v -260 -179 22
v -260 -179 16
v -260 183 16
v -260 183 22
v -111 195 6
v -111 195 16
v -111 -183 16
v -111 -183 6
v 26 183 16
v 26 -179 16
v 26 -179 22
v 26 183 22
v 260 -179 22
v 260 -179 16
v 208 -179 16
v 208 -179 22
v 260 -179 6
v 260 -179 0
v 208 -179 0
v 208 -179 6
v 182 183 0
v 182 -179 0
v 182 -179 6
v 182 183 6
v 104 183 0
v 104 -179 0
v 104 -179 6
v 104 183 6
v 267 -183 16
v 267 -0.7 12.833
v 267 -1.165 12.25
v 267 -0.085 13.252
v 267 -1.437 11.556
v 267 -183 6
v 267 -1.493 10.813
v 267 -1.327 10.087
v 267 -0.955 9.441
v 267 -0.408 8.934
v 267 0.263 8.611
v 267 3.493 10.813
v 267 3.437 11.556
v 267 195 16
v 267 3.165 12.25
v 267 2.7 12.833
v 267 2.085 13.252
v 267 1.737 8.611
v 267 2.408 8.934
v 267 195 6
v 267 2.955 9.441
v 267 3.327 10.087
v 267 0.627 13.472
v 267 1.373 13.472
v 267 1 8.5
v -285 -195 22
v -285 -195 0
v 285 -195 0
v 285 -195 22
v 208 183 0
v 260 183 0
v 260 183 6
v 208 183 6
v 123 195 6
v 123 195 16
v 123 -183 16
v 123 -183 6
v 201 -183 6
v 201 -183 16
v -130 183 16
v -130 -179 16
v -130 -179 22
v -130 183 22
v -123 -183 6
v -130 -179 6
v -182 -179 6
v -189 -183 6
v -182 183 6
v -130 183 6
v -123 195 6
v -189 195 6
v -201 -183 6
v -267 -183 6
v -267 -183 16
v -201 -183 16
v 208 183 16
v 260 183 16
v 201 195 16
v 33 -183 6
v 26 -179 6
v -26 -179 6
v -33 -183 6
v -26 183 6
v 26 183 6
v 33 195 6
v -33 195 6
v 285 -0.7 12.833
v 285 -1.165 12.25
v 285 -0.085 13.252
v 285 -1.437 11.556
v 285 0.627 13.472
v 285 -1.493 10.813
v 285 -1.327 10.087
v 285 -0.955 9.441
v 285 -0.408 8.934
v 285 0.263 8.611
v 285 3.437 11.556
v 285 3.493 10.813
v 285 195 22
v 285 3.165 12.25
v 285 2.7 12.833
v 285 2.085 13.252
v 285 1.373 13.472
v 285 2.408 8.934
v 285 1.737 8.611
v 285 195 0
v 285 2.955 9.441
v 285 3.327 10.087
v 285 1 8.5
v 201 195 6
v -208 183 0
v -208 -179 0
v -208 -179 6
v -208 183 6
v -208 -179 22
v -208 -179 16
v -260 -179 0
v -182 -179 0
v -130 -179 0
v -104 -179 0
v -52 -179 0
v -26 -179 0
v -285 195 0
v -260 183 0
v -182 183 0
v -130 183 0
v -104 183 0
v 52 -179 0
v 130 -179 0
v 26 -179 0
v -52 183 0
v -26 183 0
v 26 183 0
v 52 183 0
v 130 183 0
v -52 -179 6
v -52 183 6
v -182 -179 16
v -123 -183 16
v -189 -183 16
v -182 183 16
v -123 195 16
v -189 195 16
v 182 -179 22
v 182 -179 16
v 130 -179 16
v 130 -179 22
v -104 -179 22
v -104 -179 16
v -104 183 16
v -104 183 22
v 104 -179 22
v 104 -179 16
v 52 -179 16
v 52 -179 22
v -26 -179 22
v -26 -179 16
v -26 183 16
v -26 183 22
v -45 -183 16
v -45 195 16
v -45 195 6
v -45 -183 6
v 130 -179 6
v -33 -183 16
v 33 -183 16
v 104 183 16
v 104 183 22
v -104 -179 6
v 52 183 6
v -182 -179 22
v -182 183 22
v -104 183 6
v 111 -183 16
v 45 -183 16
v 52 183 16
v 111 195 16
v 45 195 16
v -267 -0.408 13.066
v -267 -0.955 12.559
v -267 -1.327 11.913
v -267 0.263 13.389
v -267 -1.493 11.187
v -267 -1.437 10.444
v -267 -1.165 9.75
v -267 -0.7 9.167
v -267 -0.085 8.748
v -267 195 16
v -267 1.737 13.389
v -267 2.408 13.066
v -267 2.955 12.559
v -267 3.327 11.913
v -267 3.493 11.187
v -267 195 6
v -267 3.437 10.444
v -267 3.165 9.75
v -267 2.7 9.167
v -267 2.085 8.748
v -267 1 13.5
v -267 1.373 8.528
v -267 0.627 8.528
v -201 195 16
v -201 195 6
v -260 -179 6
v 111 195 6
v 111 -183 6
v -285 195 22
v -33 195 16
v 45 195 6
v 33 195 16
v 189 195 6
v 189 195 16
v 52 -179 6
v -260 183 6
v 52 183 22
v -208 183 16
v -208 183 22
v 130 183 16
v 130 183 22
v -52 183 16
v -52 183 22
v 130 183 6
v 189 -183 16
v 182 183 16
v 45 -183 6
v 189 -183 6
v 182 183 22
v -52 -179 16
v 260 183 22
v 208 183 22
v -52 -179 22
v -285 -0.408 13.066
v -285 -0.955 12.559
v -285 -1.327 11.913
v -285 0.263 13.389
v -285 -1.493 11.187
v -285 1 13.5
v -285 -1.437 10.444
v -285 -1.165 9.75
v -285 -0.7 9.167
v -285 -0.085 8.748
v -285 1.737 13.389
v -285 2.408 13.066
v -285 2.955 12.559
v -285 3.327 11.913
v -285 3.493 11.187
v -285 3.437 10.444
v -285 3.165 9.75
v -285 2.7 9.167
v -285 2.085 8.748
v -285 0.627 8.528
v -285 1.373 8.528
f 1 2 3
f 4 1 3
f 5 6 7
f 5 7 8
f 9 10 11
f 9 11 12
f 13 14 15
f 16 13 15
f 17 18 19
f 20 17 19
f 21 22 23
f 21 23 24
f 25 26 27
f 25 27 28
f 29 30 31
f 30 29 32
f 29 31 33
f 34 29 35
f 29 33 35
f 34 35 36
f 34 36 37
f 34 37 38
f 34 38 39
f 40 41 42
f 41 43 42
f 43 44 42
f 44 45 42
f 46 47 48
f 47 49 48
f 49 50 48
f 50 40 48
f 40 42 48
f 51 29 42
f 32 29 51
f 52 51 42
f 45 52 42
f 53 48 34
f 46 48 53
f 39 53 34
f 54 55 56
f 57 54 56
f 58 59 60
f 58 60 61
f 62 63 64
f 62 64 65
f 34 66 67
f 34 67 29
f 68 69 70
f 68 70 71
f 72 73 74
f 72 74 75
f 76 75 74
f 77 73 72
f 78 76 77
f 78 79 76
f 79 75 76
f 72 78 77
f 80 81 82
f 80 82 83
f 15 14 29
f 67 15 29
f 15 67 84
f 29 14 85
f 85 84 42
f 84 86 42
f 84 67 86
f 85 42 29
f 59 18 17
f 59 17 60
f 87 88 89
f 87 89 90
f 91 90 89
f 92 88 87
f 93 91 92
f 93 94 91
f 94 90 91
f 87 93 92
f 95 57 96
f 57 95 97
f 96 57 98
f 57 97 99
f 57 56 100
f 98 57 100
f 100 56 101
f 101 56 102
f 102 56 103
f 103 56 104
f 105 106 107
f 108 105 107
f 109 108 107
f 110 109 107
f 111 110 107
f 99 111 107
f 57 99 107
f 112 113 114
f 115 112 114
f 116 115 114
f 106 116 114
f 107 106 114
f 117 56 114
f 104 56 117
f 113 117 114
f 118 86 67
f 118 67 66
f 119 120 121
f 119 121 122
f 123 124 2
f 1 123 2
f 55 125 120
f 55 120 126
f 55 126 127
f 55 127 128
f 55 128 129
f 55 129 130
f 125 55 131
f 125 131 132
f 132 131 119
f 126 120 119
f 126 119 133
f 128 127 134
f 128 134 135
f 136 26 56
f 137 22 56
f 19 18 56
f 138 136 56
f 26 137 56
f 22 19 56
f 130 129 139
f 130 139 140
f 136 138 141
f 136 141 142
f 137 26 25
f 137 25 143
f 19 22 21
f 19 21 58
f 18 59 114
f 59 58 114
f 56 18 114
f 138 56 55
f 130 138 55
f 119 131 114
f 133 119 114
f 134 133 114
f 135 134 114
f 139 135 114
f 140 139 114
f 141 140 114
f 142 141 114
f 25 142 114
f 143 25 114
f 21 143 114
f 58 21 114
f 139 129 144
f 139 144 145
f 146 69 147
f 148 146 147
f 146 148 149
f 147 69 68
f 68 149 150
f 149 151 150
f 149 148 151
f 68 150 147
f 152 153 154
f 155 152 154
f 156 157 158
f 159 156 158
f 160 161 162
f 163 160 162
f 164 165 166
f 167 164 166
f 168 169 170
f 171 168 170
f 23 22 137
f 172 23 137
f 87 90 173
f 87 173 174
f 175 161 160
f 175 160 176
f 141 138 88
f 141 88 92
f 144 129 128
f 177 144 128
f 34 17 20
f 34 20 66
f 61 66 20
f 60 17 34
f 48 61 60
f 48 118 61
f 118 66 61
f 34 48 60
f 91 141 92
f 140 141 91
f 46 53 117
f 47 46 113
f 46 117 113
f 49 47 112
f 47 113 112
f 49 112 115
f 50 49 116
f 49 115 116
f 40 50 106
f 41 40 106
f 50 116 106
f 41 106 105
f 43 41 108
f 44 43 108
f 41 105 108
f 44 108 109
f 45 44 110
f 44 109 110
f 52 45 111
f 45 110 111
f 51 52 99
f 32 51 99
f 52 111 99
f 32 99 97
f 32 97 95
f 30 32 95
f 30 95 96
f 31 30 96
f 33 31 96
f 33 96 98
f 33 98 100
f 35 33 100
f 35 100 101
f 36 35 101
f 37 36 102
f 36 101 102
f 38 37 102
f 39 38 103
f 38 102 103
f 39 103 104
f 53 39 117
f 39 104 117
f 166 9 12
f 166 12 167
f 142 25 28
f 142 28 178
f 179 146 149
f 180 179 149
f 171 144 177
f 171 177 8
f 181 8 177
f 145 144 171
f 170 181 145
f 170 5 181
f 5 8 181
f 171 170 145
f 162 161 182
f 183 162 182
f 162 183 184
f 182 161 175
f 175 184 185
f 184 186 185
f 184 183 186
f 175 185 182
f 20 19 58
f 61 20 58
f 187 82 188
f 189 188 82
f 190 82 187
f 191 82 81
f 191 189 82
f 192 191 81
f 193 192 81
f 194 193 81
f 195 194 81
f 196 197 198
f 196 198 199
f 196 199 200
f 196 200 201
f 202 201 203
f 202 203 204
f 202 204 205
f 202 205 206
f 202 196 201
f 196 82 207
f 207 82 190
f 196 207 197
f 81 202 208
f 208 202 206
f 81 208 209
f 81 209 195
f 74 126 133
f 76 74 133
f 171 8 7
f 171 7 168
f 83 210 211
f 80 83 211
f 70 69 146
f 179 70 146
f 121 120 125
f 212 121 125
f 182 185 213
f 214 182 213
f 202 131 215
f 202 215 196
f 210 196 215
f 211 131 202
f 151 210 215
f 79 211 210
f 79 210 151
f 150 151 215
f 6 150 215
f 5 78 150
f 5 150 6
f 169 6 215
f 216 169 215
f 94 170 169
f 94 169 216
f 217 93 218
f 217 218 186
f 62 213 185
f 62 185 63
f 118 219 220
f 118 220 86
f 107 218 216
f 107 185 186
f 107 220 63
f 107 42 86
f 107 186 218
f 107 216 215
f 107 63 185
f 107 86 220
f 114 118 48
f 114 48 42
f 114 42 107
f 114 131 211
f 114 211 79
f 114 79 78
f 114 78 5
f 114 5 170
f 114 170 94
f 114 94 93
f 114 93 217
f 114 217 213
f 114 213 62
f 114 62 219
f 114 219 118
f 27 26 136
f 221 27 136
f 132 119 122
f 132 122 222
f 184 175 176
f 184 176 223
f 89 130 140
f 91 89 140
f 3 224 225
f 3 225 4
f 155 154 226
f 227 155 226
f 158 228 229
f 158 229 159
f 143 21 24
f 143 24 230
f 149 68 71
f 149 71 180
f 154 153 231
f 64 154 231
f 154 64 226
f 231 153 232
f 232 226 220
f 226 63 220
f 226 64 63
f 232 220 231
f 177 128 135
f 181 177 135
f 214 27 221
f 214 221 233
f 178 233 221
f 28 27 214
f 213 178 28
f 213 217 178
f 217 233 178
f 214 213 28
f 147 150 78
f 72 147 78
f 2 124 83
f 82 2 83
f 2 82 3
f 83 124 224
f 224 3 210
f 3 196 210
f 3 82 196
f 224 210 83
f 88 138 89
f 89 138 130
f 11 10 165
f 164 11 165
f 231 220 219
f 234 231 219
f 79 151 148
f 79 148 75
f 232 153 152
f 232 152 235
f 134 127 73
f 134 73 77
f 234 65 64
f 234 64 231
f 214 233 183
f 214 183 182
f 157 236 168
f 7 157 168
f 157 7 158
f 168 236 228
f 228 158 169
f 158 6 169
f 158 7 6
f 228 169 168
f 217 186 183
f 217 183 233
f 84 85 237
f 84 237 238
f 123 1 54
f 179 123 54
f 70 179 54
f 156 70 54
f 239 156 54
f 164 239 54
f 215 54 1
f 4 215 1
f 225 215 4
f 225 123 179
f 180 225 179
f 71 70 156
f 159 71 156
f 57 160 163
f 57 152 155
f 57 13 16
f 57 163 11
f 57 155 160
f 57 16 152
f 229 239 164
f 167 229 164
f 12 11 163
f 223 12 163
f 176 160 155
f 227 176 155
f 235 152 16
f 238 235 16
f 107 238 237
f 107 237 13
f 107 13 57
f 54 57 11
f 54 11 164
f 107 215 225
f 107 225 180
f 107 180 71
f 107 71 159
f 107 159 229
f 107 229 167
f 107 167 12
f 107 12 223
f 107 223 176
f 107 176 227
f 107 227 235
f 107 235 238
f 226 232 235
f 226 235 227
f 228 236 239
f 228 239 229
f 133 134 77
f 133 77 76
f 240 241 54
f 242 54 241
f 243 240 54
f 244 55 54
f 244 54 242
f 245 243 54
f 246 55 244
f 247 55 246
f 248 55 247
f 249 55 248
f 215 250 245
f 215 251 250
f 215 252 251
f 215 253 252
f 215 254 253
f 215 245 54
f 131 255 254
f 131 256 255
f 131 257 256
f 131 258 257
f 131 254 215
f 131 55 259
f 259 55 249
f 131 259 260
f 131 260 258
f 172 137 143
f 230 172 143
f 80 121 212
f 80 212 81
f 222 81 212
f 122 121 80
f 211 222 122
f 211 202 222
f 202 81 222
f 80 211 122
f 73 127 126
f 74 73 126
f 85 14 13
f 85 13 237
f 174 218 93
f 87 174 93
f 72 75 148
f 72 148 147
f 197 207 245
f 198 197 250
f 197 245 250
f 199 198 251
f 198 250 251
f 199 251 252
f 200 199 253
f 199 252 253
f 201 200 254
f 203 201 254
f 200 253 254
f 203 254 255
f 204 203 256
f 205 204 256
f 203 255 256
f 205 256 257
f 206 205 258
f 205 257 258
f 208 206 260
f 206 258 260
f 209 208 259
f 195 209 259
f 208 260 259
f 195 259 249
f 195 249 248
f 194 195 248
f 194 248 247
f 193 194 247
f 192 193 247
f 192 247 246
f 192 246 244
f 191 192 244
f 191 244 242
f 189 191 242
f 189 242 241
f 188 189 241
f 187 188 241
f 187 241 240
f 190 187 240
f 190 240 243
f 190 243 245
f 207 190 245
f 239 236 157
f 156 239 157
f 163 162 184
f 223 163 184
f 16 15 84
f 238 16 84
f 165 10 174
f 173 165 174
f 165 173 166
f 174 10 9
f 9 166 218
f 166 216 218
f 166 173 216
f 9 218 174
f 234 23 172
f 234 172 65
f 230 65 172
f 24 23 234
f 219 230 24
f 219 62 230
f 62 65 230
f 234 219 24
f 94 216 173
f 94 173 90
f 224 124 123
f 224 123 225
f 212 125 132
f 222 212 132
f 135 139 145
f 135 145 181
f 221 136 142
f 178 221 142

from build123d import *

# Parameters (mm, degrees)
SKETCH2_W           = 570
SKETCH2_H           = 390
BOSS_EXTRUDE1_DEPTH = 22
SKETCH4_W           = 534
SKETCH4_H           = 10
CUT_EXTRUDE1_DEPTH  = 378
SKETCH5_W           = 12
SKETCH5_H           = 10
BOSS_EXTRUDE2_DEPTH = 378
CUT_EXTRUDE3_REACH  = 572
SKETCH6_R           = 2.5
CUT_EXTRUDE4_REACH  = 572
SKETCH7_R           = 2.5
SKETCH3_W           = 52
SKETCH3_H           = 362
CUT_EXTRUDE5_DEPTH  = 23


with BuildPart() as part:
    # Sketch2 → Boss-Extrude1 (new body)
    with BuildSketch(Plane.XY):
        Rectangle(SKETCH2_W, SKETCH2_H)
    extrude(amount=BOSS_EXTRUDE1_DEPTH)

    # Sketch4 → Cut-Extrude1 (cut)
    with BuildSketch(Plane(origin=(0, 195, 0), x_dir=(1, 0, 0), z_dir=(0, 1, 0))):
        with Locations((0, -11)):
            Rectangle(SKETCH4_W, SKETCH4_H)
    extrude(amount=-CUT_EXTRUDE1_DEPTH, mode=Mode.SUBTRACT)

    # Sketch5 → Boss-Extrude2 (add)
    with BuildSketch(Plane(origin=(0, 195, 0), x_dir=(1, 0, 0), z_dir=(0, 1, 0))):
        with Locations((195, -11)):
            Rectangle(SKETCH5_W, SKETCH5_H)
        with Locations((117, -11)):
            Rectangle(SKETCH5_W, SKETCH5_H)
        with Locations((39, -11)):
            Rectangle(SKETCH5_W, SKETCH5_H)
        with Locations((-39, -11)):
            Rectangle(SKETCH5_W, SKETCH5_H)
        with Locations((-117, -11)):
            Rectangle(SKETCH5_W, SKETCH5_H)
        with Locations((-195, -11)):
            Rectangle(SKETCH5_W, SKETCH5_H)
    extrude(amount=-BOSS_EXTRUDE2_DEPTH)

    # Sketch6 → Cut-Extrude3 (cut, up to next)
    with BuildSketch(Plane.ZY.offset(285), mode=Mode.PRIVATE) as cut_extrude3_sk1:
        with Locations((11, 1)):
            Circle(SKETCH6_R)
    cut_extrude3_tool1 = extrude(cut_extrude3_sk1.sketch, amount=-CUT_EXTRUDE3_REACH, mode=Mode.PRIVATE) & part.part
    add(cut_extrude3_tool1.solids().sort_by_distance((-285, 1, 11))[0], mode=Mode.SUBTRACT)

    # Sketch7 → Cut-Extrude4 (cut, up to next)
    with BuildSketch(Plane(origin=(285, 0, 0), x_dir=(0, 0, -1), z_dir=(1, 0, 0)), mode=Mode.PRIVATE) as cut_extrude4_sk1:
        with Locations((-11, 1)):
            Circle(SKETCH7_R)
    cut_extrude4_tool1 = extrude(cut_extrude4_sk1.sketch, amount=-CUT_EXTRUDE4_REACH, mode=Mode.PRIVATE) & part.part
    add(cut_extrude4_tool1.solids().sort_by_distance((285, 1, 11))[0], mode=Mode.SUBTRACT)

    # Sketch3 → Cut-Extrude5 (cut, through all)
    with BuildSketch(Plane(origin=(0, 0, 0), x_dir=(-1, 0, 0), z_dir=(0, 0, -1))):
        with Locations((-156, 2)):
            Rectangle(SKETCH3_W, SKETCH3_H)
        with Locations((-234, 2)):
            Rectangle(SKETCH3_W, SKETCH3_H)
        with Locations((-78, 2)):
            Rectangle(SKETCH3_W, SKETCH3_H)
        with Locations((0, 2)):
            Rectangle(SKETCH3_W, SKETCH3_H)
        with Locations((78, 2)):
            Rectangle(SKETCH3_W, SKETCH3_H)
        with Locations((156, 2)):
            Rectangle(SKETCH3_W, SKETCH3_H)
        with Locations((234, 2)):
            Rectangle(SKETCH3_W, SKETCH3_H)
    extrude(amount=-CUT_EXTRUDE5_DEPTH, mode=Mode.SUBTRACT)


solid = part.part
